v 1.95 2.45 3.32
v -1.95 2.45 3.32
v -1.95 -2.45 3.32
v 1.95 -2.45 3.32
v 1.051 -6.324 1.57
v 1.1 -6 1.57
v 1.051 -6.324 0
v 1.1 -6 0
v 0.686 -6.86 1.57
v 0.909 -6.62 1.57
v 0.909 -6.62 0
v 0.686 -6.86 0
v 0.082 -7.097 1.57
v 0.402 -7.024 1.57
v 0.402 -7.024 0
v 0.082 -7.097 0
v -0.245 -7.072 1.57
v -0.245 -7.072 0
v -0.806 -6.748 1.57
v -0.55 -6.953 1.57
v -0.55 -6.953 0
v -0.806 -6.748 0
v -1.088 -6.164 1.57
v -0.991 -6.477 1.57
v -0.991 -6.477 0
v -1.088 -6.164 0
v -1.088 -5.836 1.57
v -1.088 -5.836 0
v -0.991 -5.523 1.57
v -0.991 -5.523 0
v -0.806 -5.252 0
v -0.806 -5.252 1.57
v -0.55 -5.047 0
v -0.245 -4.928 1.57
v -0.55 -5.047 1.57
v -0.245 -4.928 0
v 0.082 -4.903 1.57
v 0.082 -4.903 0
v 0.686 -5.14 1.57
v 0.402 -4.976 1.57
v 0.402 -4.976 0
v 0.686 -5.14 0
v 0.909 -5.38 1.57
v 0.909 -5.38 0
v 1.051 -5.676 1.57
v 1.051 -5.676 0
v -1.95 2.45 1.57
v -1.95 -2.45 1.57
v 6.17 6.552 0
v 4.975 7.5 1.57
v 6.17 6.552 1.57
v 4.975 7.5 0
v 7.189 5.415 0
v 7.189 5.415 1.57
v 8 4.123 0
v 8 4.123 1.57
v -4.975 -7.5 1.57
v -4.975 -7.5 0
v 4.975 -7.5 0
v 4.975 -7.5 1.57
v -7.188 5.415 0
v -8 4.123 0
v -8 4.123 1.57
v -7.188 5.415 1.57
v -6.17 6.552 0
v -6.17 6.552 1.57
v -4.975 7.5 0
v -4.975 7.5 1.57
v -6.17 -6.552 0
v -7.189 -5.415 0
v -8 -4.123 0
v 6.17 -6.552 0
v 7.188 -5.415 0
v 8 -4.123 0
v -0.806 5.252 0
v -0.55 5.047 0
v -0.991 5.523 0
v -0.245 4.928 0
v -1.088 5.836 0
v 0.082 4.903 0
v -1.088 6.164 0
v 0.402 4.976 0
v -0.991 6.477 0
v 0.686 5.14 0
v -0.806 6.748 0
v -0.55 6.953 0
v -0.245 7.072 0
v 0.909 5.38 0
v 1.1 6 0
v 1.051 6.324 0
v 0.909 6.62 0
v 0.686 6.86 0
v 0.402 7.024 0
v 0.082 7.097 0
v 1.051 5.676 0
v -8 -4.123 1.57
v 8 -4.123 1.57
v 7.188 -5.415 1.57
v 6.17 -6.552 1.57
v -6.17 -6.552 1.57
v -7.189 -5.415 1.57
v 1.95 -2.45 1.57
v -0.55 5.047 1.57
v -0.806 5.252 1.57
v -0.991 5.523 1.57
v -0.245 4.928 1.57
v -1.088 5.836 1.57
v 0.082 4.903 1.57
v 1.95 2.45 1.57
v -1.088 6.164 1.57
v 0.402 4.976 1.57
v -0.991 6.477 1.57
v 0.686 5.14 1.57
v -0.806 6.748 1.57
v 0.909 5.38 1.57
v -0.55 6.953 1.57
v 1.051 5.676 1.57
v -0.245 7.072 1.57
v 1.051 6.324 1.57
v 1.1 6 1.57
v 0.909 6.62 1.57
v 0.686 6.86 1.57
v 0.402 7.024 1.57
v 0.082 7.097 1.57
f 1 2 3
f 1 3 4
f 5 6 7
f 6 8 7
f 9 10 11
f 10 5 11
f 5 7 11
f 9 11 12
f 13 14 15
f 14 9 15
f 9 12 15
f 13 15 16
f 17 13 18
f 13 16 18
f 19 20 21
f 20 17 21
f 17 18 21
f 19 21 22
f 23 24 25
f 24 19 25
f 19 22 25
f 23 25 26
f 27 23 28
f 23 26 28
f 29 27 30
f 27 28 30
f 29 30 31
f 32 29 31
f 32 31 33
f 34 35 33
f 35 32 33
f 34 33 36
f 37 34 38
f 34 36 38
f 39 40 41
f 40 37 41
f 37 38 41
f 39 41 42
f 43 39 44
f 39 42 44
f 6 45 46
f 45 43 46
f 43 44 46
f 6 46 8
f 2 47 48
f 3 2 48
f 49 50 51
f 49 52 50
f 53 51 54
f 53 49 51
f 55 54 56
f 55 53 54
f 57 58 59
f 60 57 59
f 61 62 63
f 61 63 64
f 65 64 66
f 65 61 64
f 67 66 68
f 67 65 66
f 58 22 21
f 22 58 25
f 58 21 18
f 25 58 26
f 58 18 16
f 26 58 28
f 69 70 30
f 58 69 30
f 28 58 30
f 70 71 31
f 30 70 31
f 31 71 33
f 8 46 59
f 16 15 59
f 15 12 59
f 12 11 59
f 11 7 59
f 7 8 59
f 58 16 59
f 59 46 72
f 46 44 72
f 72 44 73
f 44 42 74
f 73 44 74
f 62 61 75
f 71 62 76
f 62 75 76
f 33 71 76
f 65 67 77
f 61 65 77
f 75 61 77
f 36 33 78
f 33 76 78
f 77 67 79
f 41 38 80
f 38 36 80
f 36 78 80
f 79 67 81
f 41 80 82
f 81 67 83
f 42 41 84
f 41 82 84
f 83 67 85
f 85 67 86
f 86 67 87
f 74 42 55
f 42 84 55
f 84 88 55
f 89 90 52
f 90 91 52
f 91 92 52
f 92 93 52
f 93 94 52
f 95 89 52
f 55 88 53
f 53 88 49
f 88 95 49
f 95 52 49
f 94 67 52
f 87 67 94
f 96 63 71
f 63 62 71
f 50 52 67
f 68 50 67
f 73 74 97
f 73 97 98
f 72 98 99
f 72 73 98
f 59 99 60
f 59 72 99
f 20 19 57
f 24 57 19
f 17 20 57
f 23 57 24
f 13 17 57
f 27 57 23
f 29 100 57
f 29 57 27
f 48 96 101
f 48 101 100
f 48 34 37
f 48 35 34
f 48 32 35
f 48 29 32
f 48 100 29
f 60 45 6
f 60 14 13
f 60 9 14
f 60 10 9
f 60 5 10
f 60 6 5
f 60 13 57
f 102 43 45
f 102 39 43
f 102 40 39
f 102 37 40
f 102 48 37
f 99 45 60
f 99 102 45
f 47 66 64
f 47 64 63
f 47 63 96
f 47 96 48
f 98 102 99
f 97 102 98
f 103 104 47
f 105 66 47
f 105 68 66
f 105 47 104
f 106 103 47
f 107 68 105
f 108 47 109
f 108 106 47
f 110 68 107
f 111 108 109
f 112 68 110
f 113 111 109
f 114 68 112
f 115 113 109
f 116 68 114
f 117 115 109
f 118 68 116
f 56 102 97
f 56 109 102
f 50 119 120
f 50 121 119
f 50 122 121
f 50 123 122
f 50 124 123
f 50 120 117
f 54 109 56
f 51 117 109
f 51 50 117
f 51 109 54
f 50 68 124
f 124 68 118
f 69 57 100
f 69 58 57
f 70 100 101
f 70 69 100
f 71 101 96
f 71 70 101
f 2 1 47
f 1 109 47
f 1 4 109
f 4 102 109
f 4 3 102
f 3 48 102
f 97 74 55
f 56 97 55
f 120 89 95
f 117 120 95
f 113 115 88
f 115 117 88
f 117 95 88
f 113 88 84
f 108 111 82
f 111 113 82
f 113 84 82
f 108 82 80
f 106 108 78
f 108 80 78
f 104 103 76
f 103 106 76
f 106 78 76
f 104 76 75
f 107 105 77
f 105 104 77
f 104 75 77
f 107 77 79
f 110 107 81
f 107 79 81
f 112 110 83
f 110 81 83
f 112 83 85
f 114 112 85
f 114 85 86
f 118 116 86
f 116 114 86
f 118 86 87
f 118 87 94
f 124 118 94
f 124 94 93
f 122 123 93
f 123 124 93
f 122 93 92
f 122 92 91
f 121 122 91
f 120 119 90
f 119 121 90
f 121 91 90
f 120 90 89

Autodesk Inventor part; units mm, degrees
ref_plane "YZ Plane" through (0, 0, 0) normal (1, 0, 0) x (0, 1, 0)
ref_plane "XZ Plane" through (0, 0, 0) normal (0, 1, 0) x (-1, 0, 0)
ref_plane "XY Plane" through (0, 0, 0) normal (0, 0, 1) x (1, 0, 0)
sketch "Sketch1" plane through (0, 0, 0) normal (0, 0, 1) x (1, 0, 0)
  line L0 (8, 7.5) -> (4.9749, 7.5) construction
  line L1 (-8, 7.5) -> (-8, 4.1231) construction
  line L2 (-8, -7.5) -> (-4.9749, -7.5) construction
  line L3 (8, -7.5) -> (8, -4.1231) construction
  arc A0 (8, 4.1231) -> (4.9749, 7.5) centre (0, 0) ccw
  arc A1 (8, -4.1231) -> (8, 4.1231) centre (0, 0) ccw construction
  arc A2 (-4.9749, 7.5) -> (-8, 4.1231) centre (0, 0) ccw
  arc A3 (-4.9749, -7.5) -> (4.9749, -7.5) centre (0, 0) ccw construction
  arc A4 (4.9749, -7.5) -> (8, -4.1231) centre (0, 0) ccw
  line L4 (4.9749, -7.5) -> (8, -7.5) construction
  line L5 (-4.9749, -7.5) -> (4.9749, -7.5)
  line L6 (-8, -4.1231) -> (-8, -7.5) construction
  line L7 (8, 4.1231) -> (8, 7.5) construction
  line L8 (8, -4.1231) -> (8, 4.1231)
  line L9 (-8, 4.1231) -> (-8, -4.1231)
  line L10 (-4.9749, 7.5) -> (-8, 7.5) construction
  arc A5 (4.9749, 7.5) -> (-4.9749, 7.5) centre (0, 0) ccw construction
  arc A6 (-8, 4.1231) -> (-8, -4.1231) centre (0, 0) ccw construction
  arc A7 (-8, -4.1231) -> (-4.9749, -7.5) centre (0, 0) ccw
  line L11 (4.9749, 7.5) -> (-4.9749, 7.5)
  circle A8 centre (0, -6) radius 1.1
  circle A9 centre (0, 6) radius 1.1
  dimension "d3" = 15
  dimension "d4" = 16
  dimension "d6" = 7.5
  dimension "d7" = 8
  dimension "d8" = 18
  dimension "d9" = 6
  dimension "d10" = 2.2
  dimension "d11" = 2.2
  dimension "d12" = 6
extrude "Extrusion1" add sketch "Sketch1" along normal blind 1.57
sketch "Sketch2" plane through (0, 0, 1.57) normal (0, 0, 1) x (1, 0, 0)
  line L0 (1.95, 2.45) -> (-1.95, 2.45)
  line L1 (-1.95, 2.45) -> (-1.95, -2.45)
  line L2 (-1.95, -2.45) -> (1.95, -2.45)
  line L3 (1.95, -2.45) -> (1.95, 2.45)
  point P0 (0, 0)
  dimension "d15" = 4.9
  dimension "d16" = 3.9
  dimension "d17" = 1.95
  dimension "d18" = 2.45
extrude "Extrusion2" add sketch "Sketch2" along normal blind 1.75
sketch "Sketch3" plane through (0, 0, 3.32) normal (0, 0, 1) x (1, 0, 0)
  circle A0 centre (0, 0) radius 1.4142
  dimension "d21" = 2.8284
properties part number "AS5600"
